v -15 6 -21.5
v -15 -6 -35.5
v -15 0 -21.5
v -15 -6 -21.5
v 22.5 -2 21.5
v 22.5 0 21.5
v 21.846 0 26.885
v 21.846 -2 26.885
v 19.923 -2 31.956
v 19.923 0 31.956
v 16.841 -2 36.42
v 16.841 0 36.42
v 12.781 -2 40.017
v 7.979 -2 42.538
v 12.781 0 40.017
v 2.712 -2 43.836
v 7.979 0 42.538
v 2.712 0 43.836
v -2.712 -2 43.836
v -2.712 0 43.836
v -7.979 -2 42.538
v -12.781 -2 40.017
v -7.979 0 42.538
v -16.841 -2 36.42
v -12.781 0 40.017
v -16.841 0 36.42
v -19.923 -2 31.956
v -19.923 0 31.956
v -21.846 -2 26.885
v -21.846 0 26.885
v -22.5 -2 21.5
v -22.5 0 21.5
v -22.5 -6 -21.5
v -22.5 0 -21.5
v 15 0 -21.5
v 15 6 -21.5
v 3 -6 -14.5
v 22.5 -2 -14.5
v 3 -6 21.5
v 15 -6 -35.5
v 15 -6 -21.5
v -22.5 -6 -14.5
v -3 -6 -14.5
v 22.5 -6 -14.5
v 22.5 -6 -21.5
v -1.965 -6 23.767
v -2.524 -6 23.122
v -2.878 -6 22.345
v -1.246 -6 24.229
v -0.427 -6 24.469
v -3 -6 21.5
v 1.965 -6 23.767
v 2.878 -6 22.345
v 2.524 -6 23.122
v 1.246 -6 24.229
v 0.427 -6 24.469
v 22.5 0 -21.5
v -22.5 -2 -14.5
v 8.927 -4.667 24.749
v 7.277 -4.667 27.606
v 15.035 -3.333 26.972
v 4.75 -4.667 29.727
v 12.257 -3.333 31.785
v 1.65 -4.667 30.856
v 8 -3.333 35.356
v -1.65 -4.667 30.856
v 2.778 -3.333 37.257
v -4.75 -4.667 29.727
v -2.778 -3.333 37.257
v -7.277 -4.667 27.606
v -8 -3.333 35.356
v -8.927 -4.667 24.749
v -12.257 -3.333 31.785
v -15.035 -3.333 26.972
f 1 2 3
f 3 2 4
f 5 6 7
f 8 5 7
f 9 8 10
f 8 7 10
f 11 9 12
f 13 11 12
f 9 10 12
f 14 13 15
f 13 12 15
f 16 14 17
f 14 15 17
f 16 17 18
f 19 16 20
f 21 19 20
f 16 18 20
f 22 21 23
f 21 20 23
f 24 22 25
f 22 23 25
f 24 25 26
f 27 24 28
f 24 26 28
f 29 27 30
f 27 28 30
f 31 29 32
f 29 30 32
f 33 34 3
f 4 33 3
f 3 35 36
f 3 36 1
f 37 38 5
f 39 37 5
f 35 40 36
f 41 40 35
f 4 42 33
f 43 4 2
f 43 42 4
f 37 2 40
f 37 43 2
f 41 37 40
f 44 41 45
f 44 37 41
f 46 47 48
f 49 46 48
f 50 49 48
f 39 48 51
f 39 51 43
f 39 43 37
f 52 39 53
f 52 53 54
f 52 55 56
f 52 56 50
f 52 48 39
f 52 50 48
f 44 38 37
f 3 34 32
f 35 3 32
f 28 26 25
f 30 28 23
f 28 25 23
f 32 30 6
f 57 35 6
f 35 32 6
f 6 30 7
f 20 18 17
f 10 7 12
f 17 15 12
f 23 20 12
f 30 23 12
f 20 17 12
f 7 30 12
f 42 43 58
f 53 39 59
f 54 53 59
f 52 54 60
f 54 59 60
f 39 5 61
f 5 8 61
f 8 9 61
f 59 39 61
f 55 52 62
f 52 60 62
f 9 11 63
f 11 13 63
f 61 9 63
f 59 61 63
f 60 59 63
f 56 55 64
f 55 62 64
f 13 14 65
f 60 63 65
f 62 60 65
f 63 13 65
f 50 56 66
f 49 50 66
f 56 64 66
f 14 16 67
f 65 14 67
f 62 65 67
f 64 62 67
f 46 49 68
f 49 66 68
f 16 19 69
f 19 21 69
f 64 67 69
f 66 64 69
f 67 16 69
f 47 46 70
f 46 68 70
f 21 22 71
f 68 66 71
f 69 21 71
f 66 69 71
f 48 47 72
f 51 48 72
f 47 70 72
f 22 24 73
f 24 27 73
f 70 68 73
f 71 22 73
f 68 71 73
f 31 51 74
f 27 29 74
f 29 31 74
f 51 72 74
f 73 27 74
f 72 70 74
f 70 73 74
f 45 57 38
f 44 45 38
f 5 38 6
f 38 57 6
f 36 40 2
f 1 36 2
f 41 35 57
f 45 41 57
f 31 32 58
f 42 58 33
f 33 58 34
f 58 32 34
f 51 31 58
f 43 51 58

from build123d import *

# Parameters (mm, degrees)
F1_DEPTH = 6
F2_SIZE2 = 4
F2_SIZE  = 19.5
F3_W     = 45
F3_H     = 7
F4_DEPTH = 6
F5_W     = 30
F5_H     = 6
F6_DEPTH = 14
F7_W     = 30
F7_H     = 14
F8_DEPTH = 6
F9_SIZE2 = 11.99999
F9_SIZE  = 13.99999


# Not quite as in the source:
# - a fillet or chamfer is up to 0.001 mm smaller than in the source, because OpenCascade refuses the exact size


with BuildPart() as f1:
    # F0 (on Front) → F1 (new body)
    with BuildSketch(Plane.XZ):
        with BuildLine():
            ThreePointArc((0, 44), (-15.9099025767, 37.4099025767), (-22.5, 21.5))
            Line((-22.5, 21.5), (0, 21.5))
            Line((0, 21.5), (0, 44))
        make_face()
        with BuildLine():
            ThreePointArc((0, -1), (-15.9099025767, 5.5900974233), (-22.5, 21.5))
            Line((-22.5, 21.5), (-22.5, -21.5))
            Line((-22.5, -21.5), (0, -21.5))
            Line((0, -21.5), (0, -1))
        make_face()
        with BuildLine():
            Line((0, 21.5), (-22.5, 21.5))
            ThreePointArc((-22.5, 21.5), (-15.9099025767, 5.5900974233), (0, -1))
            Line((0, -1), (0, 21.5))
        make_face()
        with BuildLine():
            Line((0, 44), (0, 21.5))
            Line((0, 21.5), (22.5, 21.5))
            ThreePointArc((22.5, 21.5), (15.9099025767, 37.4099025767), (0, 44))
        make_face()
        with BuildLine():
            Line((22.5, 21.5), (0, 21.5))
            Line((0, 21.5), (0, -1))
            ThreePointArc((0, -1), (15.9099025767, 5.5900974233), (22.5, 21.5))
        make_face()
        with BuildLine():
            ThreePointArc((22.5, 21.5), (15.9099025767, 5.5900974233), (0, -1))
            Line((0, -1), (0, -21.5))
            Line((0, -21.5), (22.5, -21.5))
            Line((22.5, -21.5), (22.5, 21.5))
        make_face()
    extrude(amount=F1_DEPTH)

    # F2
    f2_edges = [f1.edges().sort_by_distance(p)[0] for p in [
        (0, -6, 44),
    ]]
    f2_side = f1.faces().sort_by_distance((0, -6, 9.043566))[0]
    chamfer(f2_edges, length=F2_SIZE, length2=F2_SIZE2, reference=f2_side)

    # F3 (on face) → F4 (join)
    with BuildSketch(Plane(origin=(0, 0, 0), x_dir=(-1, 0, 0), z_dir=(0, 1, 0))):
        with Locations((0, -18)):
            Rectangle(F3_W, F3_H)
    extrude(amount=-F4_DEPTH)

    # F5 (on face) → F6 (join)
    with BuildSketch(Plane(origin=(0, 0, -21.5), x_dir=(1, 0, 0), z_dir=(0, 0, -1))):
        with Locations((0, 3)):
            Rectangle(F5_W, F5_H)
    extrude(amount=F6_DEPTH)

    # F7 (on face) → F8 (join)
    with BuildSketch(Plane(origin=(0, 0, 0), x_dir=(-1, 0, 0), z_dir=(0, 1, 0))):
        with Locations((0, -28.5)):
            Rectangle(F7_W, F7_H)
    extrude(amount=F8_DEPTH)

    # F9 (size 14 and 12 in the source; OpenCascade refuses exactly that, so slightly less here)
    f9_edges = [f1.edges().sort_by_distance(p)[0] for p in [
        (0, 6, -35.5),
    ]]
    f9_side = f1.faces().sort_by_distance((0, 6, -28.5))[0]
    chamfer(f9_edges, length=F9_SIZE, length2=F9_SIZE2, reference=f9_side)


solid = f1.part
